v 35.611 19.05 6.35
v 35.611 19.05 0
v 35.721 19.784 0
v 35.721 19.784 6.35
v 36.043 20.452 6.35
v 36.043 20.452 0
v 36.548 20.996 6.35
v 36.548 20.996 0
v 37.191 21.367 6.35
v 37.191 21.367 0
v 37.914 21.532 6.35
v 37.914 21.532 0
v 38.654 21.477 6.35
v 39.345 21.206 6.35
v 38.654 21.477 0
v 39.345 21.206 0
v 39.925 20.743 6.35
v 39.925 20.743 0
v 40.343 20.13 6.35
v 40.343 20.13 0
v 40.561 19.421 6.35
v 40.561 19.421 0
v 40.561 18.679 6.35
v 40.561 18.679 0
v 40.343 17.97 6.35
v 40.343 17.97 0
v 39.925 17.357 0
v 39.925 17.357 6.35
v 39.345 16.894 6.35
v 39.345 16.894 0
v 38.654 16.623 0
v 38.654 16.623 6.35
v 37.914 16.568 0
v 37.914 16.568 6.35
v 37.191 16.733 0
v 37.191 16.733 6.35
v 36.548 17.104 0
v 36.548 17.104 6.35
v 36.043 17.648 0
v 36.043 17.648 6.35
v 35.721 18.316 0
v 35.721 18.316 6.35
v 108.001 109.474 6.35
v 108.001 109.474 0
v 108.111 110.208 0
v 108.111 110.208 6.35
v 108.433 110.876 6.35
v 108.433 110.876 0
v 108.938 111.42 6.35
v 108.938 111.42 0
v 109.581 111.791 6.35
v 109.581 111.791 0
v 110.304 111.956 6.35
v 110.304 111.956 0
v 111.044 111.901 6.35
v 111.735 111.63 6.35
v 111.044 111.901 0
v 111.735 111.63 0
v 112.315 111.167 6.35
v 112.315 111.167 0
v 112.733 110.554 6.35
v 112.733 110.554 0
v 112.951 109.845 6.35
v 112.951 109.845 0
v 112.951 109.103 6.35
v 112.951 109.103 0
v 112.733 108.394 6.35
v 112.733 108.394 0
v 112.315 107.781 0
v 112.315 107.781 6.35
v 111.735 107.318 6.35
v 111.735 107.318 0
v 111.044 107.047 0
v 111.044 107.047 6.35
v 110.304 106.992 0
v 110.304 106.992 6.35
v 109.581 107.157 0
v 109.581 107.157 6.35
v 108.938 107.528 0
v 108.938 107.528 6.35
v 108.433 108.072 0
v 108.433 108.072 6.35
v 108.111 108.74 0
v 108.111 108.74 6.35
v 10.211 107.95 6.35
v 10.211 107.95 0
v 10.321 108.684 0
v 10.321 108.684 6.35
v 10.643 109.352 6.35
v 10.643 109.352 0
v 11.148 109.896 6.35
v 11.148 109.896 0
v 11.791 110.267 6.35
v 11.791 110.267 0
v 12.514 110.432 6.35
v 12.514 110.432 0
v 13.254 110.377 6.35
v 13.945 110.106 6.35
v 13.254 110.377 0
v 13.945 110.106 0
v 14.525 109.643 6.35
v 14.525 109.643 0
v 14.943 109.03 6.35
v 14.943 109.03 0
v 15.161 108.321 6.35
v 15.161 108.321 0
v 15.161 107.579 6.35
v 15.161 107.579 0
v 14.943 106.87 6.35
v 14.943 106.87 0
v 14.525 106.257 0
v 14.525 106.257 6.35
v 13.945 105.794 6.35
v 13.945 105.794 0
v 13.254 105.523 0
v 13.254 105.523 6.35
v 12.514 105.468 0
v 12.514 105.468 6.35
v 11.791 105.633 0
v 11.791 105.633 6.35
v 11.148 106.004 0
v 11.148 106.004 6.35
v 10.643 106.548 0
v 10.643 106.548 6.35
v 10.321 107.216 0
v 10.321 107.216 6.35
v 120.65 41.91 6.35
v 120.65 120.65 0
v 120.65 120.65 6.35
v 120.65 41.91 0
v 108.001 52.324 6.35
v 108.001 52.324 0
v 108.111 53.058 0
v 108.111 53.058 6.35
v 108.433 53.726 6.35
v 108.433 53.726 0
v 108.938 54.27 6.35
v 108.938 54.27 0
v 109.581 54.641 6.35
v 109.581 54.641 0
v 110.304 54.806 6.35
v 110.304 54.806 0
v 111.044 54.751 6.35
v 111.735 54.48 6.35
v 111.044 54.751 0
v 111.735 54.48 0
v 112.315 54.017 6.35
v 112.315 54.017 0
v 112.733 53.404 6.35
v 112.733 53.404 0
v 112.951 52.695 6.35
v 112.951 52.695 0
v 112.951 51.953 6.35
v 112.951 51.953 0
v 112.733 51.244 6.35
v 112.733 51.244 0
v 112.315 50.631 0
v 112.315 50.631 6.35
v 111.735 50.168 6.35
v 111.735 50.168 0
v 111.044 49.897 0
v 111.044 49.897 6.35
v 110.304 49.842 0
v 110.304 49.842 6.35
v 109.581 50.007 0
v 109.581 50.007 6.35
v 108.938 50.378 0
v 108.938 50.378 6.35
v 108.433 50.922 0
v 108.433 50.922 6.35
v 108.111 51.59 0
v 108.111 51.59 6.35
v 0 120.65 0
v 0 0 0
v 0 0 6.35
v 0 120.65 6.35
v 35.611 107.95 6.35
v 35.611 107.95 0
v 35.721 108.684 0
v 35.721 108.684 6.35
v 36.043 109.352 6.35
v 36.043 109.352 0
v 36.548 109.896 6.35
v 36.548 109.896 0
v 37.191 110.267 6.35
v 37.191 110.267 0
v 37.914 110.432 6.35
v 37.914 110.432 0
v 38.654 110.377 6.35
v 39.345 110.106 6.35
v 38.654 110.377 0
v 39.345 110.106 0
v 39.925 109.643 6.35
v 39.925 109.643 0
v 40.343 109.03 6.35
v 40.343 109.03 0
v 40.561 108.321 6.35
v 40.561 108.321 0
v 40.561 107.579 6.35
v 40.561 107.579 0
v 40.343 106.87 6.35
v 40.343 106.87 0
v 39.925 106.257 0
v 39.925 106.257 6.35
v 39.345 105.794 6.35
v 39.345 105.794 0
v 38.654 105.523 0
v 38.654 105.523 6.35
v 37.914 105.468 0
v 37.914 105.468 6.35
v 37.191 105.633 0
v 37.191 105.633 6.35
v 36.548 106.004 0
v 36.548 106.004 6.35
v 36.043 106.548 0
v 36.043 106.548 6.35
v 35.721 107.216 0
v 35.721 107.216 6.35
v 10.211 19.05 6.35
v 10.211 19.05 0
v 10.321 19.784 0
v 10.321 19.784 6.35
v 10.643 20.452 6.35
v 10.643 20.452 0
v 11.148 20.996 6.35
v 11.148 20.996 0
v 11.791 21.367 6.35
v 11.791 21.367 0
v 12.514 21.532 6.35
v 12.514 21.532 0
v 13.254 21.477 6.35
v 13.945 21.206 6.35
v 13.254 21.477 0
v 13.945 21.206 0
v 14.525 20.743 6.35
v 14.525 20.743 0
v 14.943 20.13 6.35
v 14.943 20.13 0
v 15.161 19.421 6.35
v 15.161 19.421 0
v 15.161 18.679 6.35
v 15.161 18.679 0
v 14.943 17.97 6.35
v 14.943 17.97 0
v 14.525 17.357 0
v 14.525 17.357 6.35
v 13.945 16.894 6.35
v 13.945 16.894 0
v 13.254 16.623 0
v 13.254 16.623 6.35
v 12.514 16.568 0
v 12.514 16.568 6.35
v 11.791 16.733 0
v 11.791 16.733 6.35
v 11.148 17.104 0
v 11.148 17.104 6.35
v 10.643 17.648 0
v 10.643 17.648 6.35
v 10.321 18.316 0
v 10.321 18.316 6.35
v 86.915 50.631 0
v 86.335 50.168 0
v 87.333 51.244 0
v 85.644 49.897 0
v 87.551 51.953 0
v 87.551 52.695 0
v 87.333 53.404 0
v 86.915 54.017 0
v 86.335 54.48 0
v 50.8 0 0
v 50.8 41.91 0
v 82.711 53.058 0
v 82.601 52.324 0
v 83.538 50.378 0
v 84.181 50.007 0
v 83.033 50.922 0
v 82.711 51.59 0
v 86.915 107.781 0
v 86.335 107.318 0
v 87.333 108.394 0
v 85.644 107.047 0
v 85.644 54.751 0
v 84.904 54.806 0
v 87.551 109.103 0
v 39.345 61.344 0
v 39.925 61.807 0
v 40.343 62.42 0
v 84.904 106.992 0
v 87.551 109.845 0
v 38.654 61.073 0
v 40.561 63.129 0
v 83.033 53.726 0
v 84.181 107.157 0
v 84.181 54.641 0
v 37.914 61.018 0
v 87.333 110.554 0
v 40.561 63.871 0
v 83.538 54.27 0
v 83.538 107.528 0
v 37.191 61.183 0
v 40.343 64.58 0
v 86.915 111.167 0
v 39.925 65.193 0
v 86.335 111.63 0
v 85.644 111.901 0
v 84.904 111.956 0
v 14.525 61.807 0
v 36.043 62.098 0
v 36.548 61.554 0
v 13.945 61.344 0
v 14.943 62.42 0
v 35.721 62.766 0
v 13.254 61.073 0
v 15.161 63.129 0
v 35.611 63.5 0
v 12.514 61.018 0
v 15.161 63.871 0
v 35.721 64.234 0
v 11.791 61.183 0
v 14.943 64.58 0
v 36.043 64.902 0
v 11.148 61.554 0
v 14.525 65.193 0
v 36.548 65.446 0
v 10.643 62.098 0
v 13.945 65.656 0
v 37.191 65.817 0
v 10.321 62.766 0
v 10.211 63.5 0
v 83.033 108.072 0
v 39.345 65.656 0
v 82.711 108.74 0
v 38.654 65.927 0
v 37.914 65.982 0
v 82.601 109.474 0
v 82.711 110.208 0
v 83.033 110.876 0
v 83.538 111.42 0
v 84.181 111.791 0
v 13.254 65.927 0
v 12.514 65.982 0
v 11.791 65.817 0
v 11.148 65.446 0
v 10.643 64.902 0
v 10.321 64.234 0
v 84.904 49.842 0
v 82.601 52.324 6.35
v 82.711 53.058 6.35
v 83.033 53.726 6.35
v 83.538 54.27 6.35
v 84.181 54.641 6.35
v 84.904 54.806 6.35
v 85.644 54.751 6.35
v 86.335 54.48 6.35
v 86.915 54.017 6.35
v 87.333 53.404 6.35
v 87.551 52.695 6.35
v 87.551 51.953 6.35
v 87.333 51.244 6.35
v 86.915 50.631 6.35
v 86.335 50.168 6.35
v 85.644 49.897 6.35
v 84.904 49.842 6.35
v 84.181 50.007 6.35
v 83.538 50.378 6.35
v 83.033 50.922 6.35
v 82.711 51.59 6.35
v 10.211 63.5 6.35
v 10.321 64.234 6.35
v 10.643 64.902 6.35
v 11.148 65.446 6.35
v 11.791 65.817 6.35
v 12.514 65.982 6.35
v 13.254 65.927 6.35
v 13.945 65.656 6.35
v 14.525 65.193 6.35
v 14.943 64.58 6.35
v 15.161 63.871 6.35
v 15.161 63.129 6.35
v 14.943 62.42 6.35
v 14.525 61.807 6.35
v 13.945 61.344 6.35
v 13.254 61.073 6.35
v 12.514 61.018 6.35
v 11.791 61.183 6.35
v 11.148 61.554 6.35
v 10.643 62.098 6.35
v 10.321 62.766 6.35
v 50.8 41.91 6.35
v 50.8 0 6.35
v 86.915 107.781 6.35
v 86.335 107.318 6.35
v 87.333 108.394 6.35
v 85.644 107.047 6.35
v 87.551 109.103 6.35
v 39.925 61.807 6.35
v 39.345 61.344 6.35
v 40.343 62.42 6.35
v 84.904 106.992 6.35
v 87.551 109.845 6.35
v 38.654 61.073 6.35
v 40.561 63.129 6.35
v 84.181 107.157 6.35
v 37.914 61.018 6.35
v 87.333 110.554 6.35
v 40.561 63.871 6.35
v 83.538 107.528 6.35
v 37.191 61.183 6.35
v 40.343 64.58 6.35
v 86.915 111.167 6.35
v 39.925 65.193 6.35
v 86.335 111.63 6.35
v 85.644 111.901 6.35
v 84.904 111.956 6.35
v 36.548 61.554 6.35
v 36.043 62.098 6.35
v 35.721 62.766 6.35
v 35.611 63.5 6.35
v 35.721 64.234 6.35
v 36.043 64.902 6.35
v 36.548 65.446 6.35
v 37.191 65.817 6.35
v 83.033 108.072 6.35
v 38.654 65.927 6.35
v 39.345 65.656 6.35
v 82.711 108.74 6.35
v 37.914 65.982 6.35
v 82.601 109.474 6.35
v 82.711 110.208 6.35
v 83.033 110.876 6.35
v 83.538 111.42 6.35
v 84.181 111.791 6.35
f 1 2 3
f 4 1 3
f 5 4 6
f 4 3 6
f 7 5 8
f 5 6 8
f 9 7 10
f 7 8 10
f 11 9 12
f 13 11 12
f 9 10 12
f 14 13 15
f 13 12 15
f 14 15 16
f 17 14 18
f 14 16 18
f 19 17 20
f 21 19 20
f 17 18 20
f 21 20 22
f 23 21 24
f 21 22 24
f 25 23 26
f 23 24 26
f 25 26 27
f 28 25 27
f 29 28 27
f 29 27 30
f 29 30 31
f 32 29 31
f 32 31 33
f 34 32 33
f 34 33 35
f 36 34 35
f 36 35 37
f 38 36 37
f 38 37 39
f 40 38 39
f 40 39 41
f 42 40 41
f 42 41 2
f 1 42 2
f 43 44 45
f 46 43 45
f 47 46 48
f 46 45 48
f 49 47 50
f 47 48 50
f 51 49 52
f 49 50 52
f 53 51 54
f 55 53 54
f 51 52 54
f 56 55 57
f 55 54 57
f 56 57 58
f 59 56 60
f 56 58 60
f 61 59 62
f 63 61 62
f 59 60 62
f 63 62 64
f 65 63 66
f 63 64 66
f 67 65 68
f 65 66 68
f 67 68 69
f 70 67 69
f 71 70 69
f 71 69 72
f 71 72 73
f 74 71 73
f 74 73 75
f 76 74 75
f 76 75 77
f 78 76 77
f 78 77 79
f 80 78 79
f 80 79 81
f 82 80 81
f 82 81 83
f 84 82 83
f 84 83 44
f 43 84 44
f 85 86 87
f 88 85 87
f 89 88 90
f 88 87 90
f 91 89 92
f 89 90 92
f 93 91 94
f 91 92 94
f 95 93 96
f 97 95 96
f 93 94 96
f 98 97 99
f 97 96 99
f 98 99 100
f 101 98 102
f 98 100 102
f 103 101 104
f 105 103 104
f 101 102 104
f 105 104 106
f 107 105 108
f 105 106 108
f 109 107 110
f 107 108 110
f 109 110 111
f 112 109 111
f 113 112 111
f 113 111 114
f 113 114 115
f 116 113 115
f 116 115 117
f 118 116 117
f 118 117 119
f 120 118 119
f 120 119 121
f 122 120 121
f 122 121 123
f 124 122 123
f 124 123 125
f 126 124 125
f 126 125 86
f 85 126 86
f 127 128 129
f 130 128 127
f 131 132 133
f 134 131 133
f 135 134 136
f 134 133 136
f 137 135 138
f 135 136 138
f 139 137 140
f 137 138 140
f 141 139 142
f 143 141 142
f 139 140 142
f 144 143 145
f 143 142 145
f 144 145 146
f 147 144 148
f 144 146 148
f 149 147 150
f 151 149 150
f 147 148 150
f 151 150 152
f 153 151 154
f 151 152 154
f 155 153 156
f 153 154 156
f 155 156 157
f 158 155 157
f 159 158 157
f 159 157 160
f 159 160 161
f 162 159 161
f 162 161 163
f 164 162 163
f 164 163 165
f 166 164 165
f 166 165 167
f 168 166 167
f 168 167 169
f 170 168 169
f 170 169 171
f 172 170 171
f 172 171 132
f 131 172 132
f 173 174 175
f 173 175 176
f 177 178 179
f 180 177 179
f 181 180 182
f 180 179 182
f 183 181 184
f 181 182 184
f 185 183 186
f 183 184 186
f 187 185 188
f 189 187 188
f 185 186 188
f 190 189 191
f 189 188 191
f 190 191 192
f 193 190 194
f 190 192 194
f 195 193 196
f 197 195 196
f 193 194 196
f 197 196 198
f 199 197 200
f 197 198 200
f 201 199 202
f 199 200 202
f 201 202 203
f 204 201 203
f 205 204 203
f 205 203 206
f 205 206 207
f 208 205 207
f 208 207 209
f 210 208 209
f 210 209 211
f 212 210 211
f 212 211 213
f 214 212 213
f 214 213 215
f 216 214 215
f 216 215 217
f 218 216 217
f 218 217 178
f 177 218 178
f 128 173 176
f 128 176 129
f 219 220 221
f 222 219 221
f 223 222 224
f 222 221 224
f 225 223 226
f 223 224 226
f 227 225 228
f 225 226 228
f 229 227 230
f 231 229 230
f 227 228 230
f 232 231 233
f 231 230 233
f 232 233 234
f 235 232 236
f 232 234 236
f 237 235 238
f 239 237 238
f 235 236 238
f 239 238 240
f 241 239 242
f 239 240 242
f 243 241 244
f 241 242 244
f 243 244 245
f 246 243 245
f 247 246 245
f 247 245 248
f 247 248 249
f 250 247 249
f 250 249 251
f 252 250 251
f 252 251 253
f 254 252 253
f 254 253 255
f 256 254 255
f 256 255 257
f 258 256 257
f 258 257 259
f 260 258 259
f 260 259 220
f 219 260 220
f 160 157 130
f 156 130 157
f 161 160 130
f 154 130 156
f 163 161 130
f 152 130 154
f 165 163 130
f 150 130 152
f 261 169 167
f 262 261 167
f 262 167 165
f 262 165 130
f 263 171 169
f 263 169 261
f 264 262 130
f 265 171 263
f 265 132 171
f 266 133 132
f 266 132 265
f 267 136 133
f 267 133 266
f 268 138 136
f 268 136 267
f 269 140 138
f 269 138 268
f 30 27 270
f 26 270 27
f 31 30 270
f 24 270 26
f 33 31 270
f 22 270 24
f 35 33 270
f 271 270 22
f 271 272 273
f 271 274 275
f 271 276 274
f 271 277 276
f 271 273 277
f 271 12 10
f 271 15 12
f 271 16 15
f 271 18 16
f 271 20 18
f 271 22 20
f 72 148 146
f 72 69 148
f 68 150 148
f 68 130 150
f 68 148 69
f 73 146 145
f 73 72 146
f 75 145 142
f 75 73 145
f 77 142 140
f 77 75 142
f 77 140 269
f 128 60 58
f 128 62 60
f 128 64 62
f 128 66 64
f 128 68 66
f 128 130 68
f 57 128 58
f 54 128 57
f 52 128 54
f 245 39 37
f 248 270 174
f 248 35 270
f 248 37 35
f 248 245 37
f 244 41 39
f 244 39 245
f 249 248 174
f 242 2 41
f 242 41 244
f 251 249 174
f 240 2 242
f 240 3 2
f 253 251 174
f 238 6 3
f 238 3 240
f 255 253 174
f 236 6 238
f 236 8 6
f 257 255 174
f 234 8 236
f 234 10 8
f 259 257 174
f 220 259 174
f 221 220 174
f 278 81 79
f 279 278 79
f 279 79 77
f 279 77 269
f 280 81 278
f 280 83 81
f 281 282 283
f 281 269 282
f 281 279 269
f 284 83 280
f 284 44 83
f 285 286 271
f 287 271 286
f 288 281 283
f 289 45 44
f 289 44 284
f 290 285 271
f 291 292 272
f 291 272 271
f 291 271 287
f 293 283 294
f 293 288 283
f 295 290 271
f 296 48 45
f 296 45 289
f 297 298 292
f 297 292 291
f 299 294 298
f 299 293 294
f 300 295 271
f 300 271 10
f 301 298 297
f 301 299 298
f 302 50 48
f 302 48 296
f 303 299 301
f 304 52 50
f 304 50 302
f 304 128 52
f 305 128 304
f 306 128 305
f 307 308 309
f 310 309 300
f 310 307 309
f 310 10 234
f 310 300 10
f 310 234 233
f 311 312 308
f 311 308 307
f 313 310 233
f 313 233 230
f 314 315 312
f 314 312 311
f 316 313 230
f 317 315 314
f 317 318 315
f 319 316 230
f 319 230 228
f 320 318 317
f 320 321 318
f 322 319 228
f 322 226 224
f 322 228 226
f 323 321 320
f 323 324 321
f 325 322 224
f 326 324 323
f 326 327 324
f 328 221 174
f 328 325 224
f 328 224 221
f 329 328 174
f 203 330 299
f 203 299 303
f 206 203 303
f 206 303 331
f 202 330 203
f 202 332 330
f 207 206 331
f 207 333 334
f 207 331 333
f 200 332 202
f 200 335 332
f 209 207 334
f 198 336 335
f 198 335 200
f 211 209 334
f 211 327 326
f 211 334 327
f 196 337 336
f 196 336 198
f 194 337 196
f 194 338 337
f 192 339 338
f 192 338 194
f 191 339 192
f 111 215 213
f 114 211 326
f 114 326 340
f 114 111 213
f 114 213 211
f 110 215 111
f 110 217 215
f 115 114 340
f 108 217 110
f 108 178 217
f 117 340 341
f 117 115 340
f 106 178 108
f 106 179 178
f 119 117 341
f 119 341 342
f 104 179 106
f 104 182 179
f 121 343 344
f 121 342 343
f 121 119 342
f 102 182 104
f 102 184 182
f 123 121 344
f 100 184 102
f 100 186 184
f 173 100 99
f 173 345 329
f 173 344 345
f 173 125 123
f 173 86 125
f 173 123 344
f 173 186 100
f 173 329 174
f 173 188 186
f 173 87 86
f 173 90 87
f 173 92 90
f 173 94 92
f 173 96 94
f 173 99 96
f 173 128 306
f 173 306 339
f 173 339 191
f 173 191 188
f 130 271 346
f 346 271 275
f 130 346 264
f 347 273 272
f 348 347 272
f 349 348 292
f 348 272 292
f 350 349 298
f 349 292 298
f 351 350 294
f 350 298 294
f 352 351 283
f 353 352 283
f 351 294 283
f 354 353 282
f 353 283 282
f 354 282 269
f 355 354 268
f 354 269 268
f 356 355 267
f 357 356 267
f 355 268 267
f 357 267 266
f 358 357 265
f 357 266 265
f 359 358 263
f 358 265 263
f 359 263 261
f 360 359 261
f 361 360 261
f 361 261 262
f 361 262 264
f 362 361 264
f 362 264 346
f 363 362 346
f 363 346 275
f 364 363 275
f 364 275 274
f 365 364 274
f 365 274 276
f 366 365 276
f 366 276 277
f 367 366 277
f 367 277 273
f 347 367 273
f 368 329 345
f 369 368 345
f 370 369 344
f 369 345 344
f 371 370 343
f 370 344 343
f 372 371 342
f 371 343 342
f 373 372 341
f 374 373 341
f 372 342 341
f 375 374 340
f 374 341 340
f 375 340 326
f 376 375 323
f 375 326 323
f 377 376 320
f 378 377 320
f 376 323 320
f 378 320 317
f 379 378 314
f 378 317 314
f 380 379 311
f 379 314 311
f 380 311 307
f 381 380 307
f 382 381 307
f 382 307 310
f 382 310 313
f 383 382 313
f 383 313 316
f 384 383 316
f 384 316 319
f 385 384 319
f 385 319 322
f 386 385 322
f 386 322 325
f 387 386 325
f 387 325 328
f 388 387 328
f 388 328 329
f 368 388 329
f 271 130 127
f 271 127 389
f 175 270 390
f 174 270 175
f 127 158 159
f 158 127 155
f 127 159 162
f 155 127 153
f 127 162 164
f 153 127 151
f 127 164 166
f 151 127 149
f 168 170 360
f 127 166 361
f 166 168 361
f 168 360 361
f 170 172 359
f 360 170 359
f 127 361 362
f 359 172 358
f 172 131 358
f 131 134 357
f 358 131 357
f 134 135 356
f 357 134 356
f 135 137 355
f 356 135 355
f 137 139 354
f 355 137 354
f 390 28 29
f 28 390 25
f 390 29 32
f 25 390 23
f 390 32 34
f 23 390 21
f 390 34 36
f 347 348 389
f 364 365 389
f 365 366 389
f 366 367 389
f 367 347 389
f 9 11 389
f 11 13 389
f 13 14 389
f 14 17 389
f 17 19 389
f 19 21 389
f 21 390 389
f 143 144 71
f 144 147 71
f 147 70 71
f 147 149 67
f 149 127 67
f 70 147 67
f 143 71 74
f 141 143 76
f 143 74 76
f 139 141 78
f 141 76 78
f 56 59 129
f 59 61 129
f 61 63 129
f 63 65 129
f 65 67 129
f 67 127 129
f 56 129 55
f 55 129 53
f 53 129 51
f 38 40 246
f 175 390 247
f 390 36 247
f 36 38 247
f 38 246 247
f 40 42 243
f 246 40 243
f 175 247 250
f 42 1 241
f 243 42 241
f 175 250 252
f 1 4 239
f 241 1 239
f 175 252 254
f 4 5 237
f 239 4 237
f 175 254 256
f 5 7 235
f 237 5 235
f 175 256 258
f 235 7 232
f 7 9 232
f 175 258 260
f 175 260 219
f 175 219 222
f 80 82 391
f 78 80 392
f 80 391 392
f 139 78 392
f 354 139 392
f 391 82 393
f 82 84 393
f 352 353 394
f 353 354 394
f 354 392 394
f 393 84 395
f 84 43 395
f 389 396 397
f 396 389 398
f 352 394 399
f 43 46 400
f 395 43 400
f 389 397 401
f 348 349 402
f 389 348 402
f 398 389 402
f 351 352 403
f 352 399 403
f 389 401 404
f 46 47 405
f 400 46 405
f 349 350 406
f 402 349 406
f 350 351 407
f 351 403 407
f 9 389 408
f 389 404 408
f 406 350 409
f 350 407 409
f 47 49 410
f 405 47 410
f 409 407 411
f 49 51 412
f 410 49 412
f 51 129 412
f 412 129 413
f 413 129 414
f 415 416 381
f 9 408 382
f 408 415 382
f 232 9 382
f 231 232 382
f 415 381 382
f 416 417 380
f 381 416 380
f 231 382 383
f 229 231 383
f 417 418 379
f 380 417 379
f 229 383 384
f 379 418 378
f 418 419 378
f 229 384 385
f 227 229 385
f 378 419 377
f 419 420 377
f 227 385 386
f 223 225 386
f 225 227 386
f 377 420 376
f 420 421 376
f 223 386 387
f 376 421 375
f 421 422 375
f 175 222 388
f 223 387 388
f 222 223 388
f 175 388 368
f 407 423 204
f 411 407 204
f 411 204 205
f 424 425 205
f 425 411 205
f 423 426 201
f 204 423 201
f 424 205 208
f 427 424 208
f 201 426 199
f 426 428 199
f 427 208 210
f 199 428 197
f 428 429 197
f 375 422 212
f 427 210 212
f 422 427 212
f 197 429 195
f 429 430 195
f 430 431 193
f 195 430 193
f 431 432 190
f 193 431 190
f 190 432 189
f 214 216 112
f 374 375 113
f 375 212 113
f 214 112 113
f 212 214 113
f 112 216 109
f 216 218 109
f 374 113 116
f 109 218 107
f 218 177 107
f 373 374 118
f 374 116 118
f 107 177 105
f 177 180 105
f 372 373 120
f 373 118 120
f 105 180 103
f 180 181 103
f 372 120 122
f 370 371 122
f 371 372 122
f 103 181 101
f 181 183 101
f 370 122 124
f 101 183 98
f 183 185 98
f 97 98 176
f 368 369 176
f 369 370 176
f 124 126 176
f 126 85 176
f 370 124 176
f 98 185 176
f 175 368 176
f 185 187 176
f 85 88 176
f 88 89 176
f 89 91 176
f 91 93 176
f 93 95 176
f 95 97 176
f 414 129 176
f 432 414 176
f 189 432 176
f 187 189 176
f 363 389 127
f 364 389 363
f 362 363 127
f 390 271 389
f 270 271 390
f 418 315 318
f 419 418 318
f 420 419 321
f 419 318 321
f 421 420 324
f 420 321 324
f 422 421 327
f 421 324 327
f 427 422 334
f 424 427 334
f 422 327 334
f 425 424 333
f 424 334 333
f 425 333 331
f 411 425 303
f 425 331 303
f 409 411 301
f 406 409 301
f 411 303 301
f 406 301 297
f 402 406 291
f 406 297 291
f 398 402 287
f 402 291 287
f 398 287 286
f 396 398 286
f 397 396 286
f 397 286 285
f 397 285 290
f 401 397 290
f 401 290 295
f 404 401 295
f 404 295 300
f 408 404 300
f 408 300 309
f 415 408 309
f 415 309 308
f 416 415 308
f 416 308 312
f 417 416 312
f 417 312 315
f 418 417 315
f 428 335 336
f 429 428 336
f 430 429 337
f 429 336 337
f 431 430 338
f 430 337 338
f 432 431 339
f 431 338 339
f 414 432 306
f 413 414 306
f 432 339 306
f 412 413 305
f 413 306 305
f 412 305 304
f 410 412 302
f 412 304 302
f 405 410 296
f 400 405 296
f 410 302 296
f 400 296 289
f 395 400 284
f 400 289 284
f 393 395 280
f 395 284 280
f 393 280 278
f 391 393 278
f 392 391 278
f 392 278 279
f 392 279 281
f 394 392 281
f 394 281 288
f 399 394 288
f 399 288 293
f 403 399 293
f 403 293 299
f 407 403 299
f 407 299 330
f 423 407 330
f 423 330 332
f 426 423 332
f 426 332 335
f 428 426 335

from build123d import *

# Parameters (mm, degrees)
BOSS_EXTRUDE1_DEPTH = 6.35
SKETCH2_R           = 2.4892
CUT_EXTRUDE1_DEPTH  = 7.35


with BuildPart() as part:
    # Sketch1 → Boss-Extrude1 (new body)
    with BuildSketch(Plane.XY):
        Polygon((0, 0), (0, 120.65), (120.65, 120.65), (120.65, 41.91), (50.8, 41.91), (50.8, 0), align=None)
    extrude(amount=BOSS_EXTRUDE1_DEPTH)

    # Sketch2 → Cut-Extrude1 (cut, through all)
    with BuildSketch(Plane(origin=(0, 0, 0), x_dir=(-1, 0, 0), z_dir=(0, 0, -1))):
        with Locations((-110.49, 109.474)):
            Circle(SKETCH2_R)
        with Locations((-85.09, 109.474)):
            Circle(SKETCH2_R)
        with Locations((-85.09, 52.324)):
            Circle(SKETCH2_R)
        with Locations((-110.49, 52.324)):
            Circle(SKETCH2_R)
        with Locations((-38.1, 107.95)):
            Circle(SKETCH2_R)
        with Locations((-12.7, 107.95)):
            Circle(SKETCH2_R)
        with Locations((-12.7, 19.05)):
            Circle(SKETCH2_R)
        with Locations((-38.1, 19.05)):
            Circle(SKETCH2_R)
        with Locations((-38.1, 63.5)):
            Circle(SKETCH2_R)
        with Locations((-12.7, 63.5)):
            Circle(SKETCH2_R)
    extrude(amount=-CUT_EXTRUDE1_DEPTH, mode=Mode.SUBTRACT)


solid = part.part
